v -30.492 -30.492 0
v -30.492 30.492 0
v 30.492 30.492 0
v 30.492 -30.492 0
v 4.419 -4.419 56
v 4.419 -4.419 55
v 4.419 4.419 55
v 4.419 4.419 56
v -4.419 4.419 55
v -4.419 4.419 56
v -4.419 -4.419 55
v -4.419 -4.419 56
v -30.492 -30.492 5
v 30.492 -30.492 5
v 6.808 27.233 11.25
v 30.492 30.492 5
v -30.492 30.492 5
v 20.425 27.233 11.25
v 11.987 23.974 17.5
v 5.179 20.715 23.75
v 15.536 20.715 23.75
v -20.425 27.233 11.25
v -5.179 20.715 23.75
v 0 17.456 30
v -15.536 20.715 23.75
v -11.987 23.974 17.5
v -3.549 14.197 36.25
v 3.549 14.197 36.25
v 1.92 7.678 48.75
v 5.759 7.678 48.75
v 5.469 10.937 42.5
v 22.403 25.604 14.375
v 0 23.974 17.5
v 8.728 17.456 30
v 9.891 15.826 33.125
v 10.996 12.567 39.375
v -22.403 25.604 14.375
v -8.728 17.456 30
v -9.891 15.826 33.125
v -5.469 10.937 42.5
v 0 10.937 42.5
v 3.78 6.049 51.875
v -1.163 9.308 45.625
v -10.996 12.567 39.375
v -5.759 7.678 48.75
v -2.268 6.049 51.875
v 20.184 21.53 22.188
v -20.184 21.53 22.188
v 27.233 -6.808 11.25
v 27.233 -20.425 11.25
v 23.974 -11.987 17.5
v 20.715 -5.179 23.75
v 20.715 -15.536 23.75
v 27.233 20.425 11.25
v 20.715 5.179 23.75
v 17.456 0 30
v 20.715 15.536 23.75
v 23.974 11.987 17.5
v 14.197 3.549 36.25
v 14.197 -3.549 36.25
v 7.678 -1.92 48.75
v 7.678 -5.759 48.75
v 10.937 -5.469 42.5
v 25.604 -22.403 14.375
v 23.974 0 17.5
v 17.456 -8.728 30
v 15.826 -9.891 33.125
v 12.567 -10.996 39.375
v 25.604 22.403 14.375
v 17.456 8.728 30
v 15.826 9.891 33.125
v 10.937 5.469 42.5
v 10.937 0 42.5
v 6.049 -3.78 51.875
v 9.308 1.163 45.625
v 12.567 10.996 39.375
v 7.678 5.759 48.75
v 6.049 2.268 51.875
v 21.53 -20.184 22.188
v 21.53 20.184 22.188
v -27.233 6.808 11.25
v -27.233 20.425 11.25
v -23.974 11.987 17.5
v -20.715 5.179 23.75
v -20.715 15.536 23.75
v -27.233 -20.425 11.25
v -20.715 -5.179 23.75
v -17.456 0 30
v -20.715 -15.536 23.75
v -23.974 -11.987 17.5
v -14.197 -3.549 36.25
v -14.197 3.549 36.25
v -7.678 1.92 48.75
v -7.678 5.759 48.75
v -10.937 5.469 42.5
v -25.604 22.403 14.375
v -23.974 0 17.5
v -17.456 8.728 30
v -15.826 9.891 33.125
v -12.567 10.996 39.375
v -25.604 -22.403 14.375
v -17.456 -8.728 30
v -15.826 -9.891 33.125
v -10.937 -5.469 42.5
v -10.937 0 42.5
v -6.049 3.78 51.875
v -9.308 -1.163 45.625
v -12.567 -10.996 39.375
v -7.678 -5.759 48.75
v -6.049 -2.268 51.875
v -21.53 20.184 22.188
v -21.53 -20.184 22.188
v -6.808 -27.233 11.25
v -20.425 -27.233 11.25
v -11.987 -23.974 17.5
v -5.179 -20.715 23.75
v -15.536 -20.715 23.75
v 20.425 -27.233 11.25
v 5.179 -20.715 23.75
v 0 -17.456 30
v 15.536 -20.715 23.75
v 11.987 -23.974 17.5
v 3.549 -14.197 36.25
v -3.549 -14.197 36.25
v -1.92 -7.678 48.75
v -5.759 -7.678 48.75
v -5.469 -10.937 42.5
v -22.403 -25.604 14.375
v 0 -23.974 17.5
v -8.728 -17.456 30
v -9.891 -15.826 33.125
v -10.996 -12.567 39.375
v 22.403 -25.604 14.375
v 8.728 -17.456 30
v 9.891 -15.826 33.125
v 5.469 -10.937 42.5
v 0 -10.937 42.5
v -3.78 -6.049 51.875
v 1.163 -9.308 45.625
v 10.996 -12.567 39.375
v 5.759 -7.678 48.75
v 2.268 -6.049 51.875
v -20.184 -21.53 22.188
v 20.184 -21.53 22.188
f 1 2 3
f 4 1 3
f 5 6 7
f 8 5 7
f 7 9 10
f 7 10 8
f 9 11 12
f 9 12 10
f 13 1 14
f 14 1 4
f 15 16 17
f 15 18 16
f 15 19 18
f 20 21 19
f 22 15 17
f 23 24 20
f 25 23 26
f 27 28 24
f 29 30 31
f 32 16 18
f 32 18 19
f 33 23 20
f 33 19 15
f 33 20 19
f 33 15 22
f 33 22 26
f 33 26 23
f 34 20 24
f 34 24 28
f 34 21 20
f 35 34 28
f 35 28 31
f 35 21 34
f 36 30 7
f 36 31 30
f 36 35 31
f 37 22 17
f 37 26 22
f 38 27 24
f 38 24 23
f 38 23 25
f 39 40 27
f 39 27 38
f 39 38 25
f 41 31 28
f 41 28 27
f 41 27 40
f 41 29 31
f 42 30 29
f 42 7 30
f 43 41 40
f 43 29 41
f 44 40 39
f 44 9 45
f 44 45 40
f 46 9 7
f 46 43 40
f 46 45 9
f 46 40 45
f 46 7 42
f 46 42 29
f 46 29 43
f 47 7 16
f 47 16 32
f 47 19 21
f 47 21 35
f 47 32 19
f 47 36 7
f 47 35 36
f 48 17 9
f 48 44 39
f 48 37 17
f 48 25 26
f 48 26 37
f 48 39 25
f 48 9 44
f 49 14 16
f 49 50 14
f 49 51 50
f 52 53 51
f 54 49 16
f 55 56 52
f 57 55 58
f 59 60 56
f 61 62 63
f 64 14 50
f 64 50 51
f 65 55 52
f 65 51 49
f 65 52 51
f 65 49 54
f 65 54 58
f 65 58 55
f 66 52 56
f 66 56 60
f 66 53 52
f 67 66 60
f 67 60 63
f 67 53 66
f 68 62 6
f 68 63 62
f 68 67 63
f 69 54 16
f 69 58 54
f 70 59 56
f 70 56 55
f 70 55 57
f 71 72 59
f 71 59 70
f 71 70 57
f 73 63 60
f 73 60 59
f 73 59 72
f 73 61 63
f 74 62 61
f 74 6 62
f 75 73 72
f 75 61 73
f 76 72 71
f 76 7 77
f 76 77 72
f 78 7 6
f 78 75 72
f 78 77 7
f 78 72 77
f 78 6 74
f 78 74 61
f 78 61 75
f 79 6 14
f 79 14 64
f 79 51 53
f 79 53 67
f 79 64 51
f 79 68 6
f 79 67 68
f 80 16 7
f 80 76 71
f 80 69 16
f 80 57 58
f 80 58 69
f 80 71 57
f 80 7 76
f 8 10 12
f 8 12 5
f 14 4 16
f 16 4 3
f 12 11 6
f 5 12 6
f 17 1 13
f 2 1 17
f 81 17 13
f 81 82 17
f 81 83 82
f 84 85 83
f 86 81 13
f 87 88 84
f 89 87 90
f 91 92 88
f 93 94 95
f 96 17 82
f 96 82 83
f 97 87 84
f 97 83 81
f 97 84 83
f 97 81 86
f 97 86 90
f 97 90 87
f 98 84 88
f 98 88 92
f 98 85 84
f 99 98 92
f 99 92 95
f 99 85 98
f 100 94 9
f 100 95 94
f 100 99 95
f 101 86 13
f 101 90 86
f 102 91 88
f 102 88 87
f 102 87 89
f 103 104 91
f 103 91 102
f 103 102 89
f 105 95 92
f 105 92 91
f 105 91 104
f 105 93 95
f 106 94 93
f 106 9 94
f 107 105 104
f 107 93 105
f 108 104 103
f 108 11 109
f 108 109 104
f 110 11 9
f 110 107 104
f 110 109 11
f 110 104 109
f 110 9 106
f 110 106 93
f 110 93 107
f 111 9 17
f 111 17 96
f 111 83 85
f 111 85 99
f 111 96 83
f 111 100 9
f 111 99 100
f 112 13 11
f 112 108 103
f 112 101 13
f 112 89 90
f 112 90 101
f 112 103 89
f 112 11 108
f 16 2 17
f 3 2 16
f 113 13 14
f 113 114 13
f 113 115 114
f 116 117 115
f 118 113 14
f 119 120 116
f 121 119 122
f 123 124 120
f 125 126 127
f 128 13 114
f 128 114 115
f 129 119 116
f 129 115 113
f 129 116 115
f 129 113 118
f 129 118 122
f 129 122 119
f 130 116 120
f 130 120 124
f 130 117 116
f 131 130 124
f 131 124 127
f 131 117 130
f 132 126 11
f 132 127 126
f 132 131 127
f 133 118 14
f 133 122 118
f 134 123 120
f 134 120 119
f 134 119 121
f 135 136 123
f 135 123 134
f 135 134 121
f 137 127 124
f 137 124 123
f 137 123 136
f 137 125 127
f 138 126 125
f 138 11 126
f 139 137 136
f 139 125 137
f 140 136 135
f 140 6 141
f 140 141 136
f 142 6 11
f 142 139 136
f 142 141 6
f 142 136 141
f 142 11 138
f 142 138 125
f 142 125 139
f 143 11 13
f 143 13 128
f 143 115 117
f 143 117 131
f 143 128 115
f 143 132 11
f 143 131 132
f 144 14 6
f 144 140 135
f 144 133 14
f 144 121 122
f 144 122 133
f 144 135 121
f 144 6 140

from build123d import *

# Parameters (mm, degrees)
F0_W      = 60.984724
F0_H      = 60.984724
F1_DEPTH  = 5
F3_W      = 8.838362
F3_H      = 8.838362
F4_DEPTH  = 1
F1_FACE_W = 60.984724
F1_FACE_H = 60.984724
F4_FACE_W = 8.838362
F4_FACE_H = 8.838362


with BuildPart() as f1:
    # F0 (on Top) → F1 (new body)
    with BuildSketch(Plane.XY):
        Rectangle(F0_W, F0_H)
    extrude(amount=F1_DEPTH)



with BuildPart() as f4:
    # F3 (on offset) → F4 (new body)
    with BuildSketch(Plane.XY.offset(55)):
        Rectangle(F3_W, F3_H)
    extrude(amount=F4_DEPTH)


with BuildPart() as f1_1:
    add(f1.part)

    add(f4.part)  # F5 merges F4
    # F1_face (on face) → F5 section 0
    with BuildSketch(Plane.XY.offset(5)):
        Rectangle(F1_FACE_W, F1_FACE_H)
    # F4_face (on face) → F5 section 1
    with BuildSketch(Plane(origin=(0, 0, 55), x_dir=(1, 0, 0), z_dir=(0, 0, -1))):
        Rectangle(F4_FACE_W, F4_FACE_H)
    loft()


solid = f1_1.part
